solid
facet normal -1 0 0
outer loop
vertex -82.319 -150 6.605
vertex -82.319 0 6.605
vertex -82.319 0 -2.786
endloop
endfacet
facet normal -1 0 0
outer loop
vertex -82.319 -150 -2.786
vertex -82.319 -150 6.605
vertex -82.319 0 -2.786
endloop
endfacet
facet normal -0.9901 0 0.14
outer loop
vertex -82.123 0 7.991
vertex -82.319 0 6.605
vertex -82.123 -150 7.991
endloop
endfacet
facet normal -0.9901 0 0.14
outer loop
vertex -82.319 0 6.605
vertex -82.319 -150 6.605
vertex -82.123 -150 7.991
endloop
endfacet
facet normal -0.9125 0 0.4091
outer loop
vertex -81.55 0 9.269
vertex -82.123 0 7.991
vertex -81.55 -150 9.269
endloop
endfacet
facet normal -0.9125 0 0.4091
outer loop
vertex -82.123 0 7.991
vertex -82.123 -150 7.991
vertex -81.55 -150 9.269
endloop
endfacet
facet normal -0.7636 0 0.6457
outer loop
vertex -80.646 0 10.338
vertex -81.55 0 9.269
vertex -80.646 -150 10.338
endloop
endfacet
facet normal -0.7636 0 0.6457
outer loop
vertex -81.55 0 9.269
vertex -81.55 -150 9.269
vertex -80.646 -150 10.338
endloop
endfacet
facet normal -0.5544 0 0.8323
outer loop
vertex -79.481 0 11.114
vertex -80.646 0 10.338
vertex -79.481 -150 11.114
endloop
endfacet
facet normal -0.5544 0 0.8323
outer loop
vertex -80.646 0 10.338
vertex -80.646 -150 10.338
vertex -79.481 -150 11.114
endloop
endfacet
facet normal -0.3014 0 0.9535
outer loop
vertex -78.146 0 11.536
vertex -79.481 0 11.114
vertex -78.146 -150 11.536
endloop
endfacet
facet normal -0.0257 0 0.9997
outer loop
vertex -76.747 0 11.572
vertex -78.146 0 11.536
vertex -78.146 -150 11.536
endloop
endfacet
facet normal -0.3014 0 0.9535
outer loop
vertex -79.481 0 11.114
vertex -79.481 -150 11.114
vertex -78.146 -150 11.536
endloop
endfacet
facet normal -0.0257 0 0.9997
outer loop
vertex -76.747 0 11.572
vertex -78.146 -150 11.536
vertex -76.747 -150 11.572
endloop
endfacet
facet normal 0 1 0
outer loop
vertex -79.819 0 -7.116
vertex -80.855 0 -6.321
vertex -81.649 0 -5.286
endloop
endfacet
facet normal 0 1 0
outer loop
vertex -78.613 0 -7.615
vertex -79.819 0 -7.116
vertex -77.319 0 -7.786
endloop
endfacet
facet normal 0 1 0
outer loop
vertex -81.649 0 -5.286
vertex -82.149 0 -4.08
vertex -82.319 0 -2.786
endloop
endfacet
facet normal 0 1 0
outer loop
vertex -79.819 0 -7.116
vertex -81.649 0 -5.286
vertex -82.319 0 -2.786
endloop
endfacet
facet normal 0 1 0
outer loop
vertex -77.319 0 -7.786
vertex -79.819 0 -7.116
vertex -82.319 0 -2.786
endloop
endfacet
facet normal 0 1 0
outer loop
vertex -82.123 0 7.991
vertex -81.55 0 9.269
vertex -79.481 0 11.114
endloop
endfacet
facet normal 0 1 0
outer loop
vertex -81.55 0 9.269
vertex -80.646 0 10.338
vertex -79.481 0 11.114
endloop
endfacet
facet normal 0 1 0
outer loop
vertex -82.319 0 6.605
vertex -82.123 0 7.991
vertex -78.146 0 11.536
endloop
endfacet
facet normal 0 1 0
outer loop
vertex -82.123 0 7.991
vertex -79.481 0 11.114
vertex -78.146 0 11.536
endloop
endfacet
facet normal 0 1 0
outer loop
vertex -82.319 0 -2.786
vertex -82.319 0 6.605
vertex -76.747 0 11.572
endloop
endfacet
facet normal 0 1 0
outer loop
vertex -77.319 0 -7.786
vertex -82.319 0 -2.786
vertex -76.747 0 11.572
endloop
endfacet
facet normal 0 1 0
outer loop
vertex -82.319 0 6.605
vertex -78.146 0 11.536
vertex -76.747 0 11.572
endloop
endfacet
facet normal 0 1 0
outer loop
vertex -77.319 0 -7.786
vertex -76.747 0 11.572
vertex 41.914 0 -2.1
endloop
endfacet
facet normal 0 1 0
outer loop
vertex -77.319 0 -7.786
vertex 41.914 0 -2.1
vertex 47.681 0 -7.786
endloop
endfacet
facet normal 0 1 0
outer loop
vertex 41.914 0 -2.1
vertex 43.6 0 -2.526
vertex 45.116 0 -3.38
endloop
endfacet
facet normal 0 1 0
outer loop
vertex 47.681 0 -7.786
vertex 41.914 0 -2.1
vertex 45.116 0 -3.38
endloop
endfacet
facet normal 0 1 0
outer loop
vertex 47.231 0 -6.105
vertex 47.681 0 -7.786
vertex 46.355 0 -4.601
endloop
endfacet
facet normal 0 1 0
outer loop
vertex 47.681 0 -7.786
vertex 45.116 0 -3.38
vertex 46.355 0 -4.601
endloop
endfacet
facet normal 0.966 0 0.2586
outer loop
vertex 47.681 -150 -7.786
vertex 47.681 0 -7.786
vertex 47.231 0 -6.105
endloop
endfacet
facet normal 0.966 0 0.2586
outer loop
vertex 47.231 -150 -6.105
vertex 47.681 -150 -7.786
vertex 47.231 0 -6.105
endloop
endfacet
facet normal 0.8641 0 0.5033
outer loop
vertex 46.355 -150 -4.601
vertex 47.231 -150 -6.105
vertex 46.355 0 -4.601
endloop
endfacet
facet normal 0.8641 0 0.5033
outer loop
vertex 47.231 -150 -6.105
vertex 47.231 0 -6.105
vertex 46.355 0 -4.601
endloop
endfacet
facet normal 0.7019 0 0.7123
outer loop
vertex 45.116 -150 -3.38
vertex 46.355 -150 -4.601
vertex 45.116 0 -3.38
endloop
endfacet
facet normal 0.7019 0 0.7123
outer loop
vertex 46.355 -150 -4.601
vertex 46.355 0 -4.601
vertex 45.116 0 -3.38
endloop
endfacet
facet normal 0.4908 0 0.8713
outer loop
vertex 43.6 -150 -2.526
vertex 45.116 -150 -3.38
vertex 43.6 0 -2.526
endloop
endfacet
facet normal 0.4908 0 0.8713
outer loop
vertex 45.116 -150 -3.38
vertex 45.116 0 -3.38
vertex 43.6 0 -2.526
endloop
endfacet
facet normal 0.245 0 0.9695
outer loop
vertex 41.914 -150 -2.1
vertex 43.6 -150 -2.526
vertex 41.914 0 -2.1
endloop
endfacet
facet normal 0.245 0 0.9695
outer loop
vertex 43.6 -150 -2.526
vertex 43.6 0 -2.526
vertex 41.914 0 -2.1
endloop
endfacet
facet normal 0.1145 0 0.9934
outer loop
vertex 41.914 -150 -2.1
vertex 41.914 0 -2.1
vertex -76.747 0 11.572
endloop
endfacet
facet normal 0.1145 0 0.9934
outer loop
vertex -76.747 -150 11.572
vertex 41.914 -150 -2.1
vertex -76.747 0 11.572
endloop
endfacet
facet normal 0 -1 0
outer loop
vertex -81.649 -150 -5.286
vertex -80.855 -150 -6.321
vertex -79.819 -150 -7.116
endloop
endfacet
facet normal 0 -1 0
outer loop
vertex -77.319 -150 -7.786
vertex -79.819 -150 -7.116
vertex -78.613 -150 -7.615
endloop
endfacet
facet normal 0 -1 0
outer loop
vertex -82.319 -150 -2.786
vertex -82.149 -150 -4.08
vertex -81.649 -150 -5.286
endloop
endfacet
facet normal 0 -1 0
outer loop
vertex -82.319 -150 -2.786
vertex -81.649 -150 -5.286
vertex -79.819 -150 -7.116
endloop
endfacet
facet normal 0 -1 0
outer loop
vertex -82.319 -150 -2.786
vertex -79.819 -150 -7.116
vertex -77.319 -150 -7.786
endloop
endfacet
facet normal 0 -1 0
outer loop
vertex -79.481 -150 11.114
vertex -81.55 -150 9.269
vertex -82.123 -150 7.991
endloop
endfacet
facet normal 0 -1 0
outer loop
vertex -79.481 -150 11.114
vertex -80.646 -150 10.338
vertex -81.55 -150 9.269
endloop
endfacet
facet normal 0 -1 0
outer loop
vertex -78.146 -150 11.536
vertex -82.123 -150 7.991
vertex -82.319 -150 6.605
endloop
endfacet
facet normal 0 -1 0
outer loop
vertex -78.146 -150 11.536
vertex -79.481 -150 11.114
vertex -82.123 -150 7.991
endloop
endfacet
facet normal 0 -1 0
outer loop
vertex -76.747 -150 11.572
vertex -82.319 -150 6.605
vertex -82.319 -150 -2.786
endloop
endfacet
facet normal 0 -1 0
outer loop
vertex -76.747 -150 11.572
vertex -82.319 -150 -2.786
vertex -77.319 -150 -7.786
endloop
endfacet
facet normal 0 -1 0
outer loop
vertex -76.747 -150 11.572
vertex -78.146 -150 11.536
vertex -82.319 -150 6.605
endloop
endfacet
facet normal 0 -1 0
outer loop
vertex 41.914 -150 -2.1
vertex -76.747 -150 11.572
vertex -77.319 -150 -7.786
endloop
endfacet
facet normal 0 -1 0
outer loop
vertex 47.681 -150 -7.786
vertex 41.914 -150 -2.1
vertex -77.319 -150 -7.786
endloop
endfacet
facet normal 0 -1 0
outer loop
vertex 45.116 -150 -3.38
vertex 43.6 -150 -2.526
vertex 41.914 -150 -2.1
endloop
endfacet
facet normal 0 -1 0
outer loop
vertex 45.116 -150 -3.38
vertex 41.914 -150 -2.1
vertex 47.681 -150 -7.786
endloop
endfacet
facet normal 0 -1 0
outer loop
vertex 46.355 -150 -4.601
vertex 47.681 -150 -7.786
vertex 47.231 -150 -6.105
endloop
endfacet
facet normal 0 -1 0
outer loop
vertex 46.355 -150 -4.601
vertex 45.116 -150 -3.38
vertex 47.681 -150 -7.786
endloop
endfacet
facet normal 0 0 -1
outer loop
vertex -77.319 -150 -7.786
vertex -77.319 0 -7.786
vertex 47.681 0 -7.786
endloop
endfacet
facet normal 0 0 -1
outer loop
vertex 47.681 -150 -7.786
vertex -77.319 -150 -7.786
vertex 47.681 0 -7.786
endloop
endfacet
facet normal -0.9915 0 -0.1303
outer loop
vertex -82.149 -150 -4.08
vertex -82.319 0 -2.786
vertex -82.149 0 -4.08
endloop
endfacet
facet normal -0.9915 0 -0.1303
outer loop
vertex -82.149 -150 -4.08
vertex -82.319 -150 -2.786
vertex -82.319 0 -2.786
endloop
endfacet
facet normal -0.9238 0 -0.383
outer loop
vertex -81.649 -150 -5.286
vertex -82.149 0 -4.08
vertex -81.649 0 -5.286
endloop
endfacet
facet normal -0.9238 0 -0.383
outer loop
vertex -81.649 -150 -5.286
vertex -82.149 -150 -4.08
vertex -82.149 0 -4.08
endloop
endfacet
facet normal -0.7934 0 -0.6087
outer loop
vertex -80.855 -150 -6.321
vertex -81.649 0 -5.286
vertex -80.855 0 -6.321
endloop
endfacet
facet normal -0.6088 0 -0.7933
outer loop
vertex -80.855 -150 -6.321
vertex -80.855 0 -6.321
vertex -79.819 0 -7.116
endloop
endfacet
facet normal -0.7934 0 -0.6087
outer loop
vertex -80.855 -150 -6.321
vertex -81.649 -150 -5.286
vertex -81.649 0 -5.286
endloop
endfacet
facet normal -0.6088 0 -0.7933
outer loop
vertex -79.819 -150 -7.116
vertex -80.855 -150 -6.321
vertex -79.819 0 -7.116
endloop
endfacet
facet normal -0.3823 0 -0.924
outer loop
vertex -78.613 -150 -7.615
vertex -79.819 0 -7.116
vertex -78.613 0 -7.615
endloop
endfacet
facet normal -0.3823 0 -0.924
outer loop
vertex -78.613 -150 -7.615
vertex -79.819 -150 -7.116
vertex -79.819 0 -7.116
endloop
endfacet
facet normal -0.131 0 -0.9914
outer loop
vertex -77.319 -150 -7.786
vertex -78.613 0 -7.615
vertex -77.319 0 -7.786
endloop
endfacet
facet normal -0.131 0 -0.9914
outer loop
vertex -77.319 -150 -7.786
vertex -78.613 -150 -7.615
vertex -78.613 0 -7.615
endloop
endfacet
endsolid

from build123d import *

# Parameters (mm, degrees)
F1_DEPTH = 150
F2_R     = 5


with BuildPart() as f1:
    # F0 (on Front) → F1 (new body)
    with BuildSketch(Plane.XZ):
        with BuildLine():
            Line((-82.3190790229, 12.2144147383), (-82.3190790229, -7.7855852617))
            Line((-82.3190790229, -7.7855852617), (47.6809209771, -7.7855852617))
            ThreePointArc((47.6809209771, -7.7855852617), (45.7765227323, -3.9495345355), (41.9135876, -2.1002779249))
            Line((41.9135876, -2.1002779249), (-82.3190790229, 12.2144147383))
        make_face()
    extrude(amount=F1_DEPTH)

    # F2
    f2_edges = [f1.edges().sort_by_distance(p)[0] for p in [
        (-82.319079, -75, 12.214415),
        (-82.319079, -75, -7.785585),
    ]]
    fillet(f2_edges, radius=F2_R)


solid = f1.part
